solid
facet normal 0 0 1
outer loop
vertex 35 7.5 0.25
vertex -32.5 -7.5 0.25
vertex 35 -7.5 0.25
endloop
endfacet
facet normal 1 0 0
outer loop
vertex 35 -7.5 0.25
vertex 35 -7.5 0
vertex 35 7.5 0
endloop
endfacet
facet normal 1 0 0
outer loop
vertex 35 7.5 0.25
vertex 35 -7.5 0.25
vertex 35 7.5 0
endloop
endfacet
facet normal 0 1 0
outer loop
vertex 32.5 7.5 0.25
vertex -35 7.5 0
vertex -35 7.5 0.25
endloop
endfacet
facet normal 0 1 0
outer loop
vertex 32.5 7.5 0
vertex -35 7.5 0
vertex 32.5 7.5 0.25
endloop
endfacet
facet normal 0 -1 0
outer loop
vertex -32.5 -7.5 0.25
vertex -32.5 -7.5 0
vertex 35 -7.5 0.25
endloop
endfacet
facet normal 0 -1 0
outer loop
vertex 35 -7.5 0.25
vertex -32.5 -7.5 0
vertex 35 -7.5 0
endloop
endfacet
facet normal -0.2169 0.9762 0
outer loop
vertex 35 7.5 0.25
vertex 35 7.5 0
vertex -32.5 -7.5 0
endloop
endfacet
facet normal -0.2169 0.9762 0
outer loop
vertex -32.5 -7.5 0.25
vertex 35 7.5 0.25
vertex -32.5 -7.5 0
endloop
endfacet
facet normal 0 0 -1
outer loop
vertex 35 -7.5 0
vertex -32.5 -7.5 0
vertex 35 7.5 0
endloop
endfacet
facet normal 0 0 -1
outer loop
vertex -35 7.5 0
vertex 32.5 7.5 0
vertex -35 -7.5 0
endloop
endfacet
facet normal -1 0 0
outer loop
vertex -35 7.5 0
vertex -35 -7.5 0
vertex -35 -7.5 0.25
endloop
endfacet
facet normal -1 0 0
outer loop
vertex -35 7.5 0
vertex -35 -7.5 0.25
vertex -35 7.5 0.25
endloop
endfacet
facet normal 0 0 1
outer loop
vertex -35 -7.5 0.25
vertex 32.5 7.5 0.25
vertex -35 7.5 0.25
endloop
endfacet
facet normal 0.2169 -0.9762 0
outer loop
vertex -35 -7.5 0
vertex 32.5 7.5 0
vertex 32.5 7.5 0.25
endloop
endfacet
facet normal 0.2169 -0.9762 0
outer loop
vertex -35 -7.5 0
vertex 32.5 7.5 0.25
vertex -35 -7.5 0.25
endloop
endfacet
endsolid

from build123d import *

# Parameters (mm, degrees)
BOSS_EXTRUDE1_DEPTH   = 0.25
BOSS_EXTRUDE1_2_DEPTH = 0.25


with BuildPart() as part:
    # Sketch11 → Boss-Extrude1 (new body)
    with BuildSketch(Plane(origin=(0, -5, 0), x_dir=(1, 0, 0), z_dir=(0, 0, 1))):
        Polygon((-35, 12.5), (32.5, 12.5), (-35, -2.5), align=None)
    extrude(amount=BOSS_EXTRUDE1_DEPTH)


with BuildPart() as body_2:
    # Sketch11 → Boss-Extrude1 2 (new body)
    with BuildSketch(Plane(origin=(0, -5, 0), x_dir=(1, 0, 0), z_dir=(0, 0, 1))):
        Polygon((-32.5, -2.5), (35, -2.5), (35, 12.5), align=None)
    extrude(amount=BOSS_EXTRUDE1_2_DEPTH)


solid = Compound([part.part, body_2.part])
